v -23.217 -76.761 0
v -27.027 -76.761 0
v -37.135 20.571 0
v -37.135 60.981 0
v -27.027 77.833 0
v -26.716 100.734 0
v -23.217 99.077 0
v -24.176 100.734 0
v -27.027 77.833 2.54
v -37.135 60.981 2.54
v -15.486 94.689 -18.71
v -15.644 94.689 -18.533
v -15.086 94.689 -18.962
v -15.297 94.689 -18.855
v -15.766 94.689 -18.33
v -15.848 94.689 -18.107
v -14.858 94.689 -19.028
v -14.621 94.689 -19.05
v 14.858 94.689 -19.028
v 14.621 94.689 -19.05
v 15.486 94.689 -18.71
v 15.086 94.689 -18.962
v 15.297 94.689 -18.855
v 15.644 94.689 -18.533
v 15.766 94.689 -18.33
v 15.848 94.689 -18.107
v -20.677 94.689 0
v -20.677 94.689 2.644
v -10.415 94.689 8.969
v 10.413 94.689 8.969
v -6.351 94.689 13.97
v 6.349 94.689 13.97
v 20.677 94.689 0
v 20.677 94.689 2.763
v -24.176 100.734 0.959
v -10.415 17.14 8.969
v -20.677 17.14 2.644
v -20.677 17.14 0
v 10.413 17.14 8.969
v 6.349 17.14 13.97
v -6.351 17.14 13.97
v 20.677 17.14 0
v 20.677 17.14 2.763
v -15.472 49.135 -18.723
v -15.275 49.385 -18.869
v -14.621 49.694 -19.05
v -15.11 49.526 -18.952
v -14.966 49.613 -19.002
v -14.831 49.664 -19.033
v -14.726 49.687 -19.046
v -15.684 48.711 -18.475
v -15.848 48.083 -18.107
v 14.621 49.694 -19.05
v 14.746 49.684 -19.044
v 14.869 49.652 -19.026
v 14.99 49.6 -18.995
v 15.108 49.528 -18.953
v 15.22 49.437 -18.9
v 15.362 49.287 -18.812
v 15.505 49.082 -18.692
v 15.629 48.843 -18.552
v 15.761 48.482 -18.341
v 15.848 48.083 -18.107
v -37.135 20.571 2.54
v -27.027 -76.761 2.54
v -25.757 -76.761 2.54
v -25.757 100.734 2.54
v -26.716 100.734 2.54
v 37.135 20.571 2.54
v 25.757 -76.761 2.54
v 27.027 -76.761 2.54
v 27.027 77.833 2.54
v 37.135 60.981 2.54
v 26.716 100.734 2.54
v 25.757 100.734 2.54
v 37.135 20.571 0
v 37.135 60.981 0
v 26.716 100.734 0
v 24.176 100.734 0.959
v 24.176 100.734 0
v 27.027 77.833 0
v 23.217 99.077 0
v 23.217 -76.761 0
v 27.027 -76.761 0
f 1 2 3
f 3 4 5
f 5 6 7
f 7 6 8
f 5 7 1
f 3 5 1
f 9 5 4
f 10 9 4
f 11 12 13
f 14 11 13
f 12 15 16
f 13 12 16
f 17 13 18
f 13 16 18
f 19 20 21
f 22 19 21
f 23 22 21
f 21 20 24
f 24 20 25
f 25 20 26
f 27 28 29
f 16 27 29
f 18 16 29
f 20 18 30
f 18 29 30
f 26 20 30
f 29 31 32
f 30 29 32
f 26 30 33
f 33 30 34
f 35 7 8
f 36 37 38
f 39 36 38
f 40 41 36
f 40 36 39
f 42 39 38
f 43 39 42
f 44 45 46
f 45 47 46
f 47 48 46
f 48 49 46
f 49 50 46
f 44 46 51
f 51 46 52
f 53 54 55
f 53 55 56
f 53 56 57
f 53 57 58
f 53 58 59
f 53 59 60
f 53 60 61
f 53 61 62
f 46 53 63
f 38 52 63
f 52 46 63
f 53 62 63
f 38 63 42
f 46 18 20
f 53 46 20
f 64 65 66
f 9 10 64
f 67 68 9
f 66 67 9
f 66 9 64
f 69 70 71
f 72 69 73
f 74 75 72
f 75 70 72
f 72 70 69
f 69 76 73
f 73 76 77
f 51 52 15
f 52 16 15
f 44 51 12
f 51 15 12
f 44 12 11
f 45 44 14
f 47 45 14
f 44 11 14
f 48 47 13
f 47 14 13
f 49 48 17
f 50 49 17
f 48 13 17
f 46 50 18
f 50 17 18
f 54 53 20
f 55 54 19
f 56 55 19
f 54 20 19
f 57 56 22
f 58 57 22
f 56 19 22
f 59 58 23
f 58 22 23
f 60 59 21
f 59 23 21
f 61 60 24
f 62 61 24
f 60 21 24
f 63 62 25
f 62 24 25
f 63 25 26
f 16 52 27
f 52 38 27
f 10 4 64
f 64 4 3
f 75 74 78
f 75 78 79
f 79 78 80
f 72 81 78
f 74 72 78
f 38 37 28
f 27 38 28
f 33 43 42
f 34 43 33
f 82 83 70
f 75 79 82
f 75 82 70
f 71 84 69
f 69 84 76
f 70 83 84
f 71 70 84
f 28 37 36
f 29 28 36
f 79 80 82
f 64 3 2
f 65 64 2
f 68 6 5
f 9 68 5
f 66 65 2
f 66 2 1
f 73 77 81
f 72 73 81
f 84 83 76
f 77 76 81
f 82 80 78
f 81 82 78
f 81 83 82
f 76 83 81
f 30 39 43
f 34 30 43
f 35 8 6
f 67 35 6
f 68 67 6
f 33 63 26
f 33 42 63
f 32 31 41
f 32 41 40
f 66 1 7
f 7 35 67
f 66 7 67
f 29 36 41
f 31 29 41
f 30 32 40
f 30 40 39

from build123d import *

# Parameters (mm, degrees)
F1_DEPTH       = 2.54
F2_W           = 41.3538680857
F2_H           = 77.5493303561
F3_DEPTH       = 19.05
F5_DEPTH       = 41.656
F6_SIZE2       = 19.05
F6_SIZE        = 5.08
F7_R           = 1.27
F9_DEPTH       = 83.595498357
F10_T1_DEPTH   = 197.5782991577
F10_2_T1_DEPTH = 197.5782991577


# Not quite as in the source:
# - a fillet or chamfer that OpenCascade refuses, or shapes differently, is made with other operations: its cross-section is extruded or revolved along the edge and cut away or added


with BuildPart() as f1:
    # F0 (on Top) → F1 (new body)
    with BuildSketch(Plane.XY):
        Polygon((-37.1346319619, 20.5705222299), (-27.0269340429, -76.7609926856), (-20.6769340429, -76.7609926856), (-20.6769340429, 94.6890073144), (-24.1763866916, 100.7341753154), (-26.7163866916, 100.7341753154), (-27.0269340429, 77.8327360749), (-37.1346319619, 60.9812401235), align=None)
    extrude(amount=F1_DEPTH)

    # F10#2: chamfer of 5.08 on 1 edges, made by hand

    # F10_2_s2 → F10_2_t1 (cut)
    with BuildSketch(Plane.XZ.offset(-107.7531568933)):
        Polygon((-20.6769340429, -2.54), (-25.7569340429, 2.54), (-20.6769340429, 2.54), align=None)
    extrude(amount=F10_2_T1_DEPTH, mode=Mode.SUBTRACT)


with BuildPart() as f1b:
    # F0 (on Top) → F1, piece 2 (new body)
    with BuildSketch(Plane.XY):
        Polygon((27.0269340429, 77.8327360749), (26.7163866916, 100.7341753154), (24.1763866916, 100.7341753154), (20.6769340429, 94.6890073144), (20.6769340429, -76.7609926856), (27.0269340429, -76.7609926856), (37.1346319619, 20.5705222299), (37.1346319619, 60.9812401235), align=None)
    extrude(amount=F1_DEPTH)

    # F10: chamfer of 5.08 on 1 edges, made by hand

    # F10_s2 → F10_t1 (cut)
    with BuildSketch(Plane.XZ.offset(-107.7531568933)):
        Polygon((20.6769340429, -2.54), (25.7569340429, 2.54), (20.6769340429, 2.54), align=None)
    extrude(amount=F10_T1_DEPTH, mode=Mode.SUBTRACT)


with BuildPart() as f3:
    # F2 (on Top) → F3 (new body, symmetric)
    with BuildSketch(Plane.XY):
        with Locations((0, 55.9143421364)):
            Rectangle(F2_W, F2_H)
    extrude(amount=F3_DEPTH, both=True)

    # F4 (on face) → F5 (cut)
    with BuildSketch(Plane.YZ.offset(20.6769340429)):
        Polygon((49.6939942241, -19.05), (17.1396769583, 0), (17.1396769583, -19.05), align=None)
    extrude(amount=-F5_DEPTH, mode=Mode.SUBTRACT)

    # F6
    f6_edges = [f3.edges().sort_by_distance(p)[0] for p in [
        (20.676934, 72.191501, -19.05),
        (-20.676934, 72.191501, -19.05),
    ]]
    f6_side = f3.faces().sort_by_distance((0, 72.191501, -19.05))[0]
    chamfer(f6_edges, length=F6_SIZE, length2=F6_SIZE2, reference=f6_side)

    # F7
    f7_edges = [f3.edges().sort_by_distance(p)[0] for p in [
        (15.596934, 72.191501, -19.05),
        (-15.596934, 72.191501, -19.05),
    ]]
    fillet(f7_edges, radius=F7_R)

    # F8 (on face) → F9 (cut, through all)
    with BuildSketch(Plane.XZ.offset(-17.1396769583)):
        Polygon((-20.6769340429, 19.05), (-20.6769340429, 2.6444371324), (-10.4151861742, 8.9688580483), (-6.3513340429, 13.97), (6.3486659571, 13.97), (10.4125180885, 8.9688580483), (20.6769340429, 2.762777498), (20.6769340429, 19.05), align=None)
    extrude(amount=-F9_DEPTH, mode=Mode.SUBTRACT)


solid = Compound([f1.part, f1b.part, f3.part])
